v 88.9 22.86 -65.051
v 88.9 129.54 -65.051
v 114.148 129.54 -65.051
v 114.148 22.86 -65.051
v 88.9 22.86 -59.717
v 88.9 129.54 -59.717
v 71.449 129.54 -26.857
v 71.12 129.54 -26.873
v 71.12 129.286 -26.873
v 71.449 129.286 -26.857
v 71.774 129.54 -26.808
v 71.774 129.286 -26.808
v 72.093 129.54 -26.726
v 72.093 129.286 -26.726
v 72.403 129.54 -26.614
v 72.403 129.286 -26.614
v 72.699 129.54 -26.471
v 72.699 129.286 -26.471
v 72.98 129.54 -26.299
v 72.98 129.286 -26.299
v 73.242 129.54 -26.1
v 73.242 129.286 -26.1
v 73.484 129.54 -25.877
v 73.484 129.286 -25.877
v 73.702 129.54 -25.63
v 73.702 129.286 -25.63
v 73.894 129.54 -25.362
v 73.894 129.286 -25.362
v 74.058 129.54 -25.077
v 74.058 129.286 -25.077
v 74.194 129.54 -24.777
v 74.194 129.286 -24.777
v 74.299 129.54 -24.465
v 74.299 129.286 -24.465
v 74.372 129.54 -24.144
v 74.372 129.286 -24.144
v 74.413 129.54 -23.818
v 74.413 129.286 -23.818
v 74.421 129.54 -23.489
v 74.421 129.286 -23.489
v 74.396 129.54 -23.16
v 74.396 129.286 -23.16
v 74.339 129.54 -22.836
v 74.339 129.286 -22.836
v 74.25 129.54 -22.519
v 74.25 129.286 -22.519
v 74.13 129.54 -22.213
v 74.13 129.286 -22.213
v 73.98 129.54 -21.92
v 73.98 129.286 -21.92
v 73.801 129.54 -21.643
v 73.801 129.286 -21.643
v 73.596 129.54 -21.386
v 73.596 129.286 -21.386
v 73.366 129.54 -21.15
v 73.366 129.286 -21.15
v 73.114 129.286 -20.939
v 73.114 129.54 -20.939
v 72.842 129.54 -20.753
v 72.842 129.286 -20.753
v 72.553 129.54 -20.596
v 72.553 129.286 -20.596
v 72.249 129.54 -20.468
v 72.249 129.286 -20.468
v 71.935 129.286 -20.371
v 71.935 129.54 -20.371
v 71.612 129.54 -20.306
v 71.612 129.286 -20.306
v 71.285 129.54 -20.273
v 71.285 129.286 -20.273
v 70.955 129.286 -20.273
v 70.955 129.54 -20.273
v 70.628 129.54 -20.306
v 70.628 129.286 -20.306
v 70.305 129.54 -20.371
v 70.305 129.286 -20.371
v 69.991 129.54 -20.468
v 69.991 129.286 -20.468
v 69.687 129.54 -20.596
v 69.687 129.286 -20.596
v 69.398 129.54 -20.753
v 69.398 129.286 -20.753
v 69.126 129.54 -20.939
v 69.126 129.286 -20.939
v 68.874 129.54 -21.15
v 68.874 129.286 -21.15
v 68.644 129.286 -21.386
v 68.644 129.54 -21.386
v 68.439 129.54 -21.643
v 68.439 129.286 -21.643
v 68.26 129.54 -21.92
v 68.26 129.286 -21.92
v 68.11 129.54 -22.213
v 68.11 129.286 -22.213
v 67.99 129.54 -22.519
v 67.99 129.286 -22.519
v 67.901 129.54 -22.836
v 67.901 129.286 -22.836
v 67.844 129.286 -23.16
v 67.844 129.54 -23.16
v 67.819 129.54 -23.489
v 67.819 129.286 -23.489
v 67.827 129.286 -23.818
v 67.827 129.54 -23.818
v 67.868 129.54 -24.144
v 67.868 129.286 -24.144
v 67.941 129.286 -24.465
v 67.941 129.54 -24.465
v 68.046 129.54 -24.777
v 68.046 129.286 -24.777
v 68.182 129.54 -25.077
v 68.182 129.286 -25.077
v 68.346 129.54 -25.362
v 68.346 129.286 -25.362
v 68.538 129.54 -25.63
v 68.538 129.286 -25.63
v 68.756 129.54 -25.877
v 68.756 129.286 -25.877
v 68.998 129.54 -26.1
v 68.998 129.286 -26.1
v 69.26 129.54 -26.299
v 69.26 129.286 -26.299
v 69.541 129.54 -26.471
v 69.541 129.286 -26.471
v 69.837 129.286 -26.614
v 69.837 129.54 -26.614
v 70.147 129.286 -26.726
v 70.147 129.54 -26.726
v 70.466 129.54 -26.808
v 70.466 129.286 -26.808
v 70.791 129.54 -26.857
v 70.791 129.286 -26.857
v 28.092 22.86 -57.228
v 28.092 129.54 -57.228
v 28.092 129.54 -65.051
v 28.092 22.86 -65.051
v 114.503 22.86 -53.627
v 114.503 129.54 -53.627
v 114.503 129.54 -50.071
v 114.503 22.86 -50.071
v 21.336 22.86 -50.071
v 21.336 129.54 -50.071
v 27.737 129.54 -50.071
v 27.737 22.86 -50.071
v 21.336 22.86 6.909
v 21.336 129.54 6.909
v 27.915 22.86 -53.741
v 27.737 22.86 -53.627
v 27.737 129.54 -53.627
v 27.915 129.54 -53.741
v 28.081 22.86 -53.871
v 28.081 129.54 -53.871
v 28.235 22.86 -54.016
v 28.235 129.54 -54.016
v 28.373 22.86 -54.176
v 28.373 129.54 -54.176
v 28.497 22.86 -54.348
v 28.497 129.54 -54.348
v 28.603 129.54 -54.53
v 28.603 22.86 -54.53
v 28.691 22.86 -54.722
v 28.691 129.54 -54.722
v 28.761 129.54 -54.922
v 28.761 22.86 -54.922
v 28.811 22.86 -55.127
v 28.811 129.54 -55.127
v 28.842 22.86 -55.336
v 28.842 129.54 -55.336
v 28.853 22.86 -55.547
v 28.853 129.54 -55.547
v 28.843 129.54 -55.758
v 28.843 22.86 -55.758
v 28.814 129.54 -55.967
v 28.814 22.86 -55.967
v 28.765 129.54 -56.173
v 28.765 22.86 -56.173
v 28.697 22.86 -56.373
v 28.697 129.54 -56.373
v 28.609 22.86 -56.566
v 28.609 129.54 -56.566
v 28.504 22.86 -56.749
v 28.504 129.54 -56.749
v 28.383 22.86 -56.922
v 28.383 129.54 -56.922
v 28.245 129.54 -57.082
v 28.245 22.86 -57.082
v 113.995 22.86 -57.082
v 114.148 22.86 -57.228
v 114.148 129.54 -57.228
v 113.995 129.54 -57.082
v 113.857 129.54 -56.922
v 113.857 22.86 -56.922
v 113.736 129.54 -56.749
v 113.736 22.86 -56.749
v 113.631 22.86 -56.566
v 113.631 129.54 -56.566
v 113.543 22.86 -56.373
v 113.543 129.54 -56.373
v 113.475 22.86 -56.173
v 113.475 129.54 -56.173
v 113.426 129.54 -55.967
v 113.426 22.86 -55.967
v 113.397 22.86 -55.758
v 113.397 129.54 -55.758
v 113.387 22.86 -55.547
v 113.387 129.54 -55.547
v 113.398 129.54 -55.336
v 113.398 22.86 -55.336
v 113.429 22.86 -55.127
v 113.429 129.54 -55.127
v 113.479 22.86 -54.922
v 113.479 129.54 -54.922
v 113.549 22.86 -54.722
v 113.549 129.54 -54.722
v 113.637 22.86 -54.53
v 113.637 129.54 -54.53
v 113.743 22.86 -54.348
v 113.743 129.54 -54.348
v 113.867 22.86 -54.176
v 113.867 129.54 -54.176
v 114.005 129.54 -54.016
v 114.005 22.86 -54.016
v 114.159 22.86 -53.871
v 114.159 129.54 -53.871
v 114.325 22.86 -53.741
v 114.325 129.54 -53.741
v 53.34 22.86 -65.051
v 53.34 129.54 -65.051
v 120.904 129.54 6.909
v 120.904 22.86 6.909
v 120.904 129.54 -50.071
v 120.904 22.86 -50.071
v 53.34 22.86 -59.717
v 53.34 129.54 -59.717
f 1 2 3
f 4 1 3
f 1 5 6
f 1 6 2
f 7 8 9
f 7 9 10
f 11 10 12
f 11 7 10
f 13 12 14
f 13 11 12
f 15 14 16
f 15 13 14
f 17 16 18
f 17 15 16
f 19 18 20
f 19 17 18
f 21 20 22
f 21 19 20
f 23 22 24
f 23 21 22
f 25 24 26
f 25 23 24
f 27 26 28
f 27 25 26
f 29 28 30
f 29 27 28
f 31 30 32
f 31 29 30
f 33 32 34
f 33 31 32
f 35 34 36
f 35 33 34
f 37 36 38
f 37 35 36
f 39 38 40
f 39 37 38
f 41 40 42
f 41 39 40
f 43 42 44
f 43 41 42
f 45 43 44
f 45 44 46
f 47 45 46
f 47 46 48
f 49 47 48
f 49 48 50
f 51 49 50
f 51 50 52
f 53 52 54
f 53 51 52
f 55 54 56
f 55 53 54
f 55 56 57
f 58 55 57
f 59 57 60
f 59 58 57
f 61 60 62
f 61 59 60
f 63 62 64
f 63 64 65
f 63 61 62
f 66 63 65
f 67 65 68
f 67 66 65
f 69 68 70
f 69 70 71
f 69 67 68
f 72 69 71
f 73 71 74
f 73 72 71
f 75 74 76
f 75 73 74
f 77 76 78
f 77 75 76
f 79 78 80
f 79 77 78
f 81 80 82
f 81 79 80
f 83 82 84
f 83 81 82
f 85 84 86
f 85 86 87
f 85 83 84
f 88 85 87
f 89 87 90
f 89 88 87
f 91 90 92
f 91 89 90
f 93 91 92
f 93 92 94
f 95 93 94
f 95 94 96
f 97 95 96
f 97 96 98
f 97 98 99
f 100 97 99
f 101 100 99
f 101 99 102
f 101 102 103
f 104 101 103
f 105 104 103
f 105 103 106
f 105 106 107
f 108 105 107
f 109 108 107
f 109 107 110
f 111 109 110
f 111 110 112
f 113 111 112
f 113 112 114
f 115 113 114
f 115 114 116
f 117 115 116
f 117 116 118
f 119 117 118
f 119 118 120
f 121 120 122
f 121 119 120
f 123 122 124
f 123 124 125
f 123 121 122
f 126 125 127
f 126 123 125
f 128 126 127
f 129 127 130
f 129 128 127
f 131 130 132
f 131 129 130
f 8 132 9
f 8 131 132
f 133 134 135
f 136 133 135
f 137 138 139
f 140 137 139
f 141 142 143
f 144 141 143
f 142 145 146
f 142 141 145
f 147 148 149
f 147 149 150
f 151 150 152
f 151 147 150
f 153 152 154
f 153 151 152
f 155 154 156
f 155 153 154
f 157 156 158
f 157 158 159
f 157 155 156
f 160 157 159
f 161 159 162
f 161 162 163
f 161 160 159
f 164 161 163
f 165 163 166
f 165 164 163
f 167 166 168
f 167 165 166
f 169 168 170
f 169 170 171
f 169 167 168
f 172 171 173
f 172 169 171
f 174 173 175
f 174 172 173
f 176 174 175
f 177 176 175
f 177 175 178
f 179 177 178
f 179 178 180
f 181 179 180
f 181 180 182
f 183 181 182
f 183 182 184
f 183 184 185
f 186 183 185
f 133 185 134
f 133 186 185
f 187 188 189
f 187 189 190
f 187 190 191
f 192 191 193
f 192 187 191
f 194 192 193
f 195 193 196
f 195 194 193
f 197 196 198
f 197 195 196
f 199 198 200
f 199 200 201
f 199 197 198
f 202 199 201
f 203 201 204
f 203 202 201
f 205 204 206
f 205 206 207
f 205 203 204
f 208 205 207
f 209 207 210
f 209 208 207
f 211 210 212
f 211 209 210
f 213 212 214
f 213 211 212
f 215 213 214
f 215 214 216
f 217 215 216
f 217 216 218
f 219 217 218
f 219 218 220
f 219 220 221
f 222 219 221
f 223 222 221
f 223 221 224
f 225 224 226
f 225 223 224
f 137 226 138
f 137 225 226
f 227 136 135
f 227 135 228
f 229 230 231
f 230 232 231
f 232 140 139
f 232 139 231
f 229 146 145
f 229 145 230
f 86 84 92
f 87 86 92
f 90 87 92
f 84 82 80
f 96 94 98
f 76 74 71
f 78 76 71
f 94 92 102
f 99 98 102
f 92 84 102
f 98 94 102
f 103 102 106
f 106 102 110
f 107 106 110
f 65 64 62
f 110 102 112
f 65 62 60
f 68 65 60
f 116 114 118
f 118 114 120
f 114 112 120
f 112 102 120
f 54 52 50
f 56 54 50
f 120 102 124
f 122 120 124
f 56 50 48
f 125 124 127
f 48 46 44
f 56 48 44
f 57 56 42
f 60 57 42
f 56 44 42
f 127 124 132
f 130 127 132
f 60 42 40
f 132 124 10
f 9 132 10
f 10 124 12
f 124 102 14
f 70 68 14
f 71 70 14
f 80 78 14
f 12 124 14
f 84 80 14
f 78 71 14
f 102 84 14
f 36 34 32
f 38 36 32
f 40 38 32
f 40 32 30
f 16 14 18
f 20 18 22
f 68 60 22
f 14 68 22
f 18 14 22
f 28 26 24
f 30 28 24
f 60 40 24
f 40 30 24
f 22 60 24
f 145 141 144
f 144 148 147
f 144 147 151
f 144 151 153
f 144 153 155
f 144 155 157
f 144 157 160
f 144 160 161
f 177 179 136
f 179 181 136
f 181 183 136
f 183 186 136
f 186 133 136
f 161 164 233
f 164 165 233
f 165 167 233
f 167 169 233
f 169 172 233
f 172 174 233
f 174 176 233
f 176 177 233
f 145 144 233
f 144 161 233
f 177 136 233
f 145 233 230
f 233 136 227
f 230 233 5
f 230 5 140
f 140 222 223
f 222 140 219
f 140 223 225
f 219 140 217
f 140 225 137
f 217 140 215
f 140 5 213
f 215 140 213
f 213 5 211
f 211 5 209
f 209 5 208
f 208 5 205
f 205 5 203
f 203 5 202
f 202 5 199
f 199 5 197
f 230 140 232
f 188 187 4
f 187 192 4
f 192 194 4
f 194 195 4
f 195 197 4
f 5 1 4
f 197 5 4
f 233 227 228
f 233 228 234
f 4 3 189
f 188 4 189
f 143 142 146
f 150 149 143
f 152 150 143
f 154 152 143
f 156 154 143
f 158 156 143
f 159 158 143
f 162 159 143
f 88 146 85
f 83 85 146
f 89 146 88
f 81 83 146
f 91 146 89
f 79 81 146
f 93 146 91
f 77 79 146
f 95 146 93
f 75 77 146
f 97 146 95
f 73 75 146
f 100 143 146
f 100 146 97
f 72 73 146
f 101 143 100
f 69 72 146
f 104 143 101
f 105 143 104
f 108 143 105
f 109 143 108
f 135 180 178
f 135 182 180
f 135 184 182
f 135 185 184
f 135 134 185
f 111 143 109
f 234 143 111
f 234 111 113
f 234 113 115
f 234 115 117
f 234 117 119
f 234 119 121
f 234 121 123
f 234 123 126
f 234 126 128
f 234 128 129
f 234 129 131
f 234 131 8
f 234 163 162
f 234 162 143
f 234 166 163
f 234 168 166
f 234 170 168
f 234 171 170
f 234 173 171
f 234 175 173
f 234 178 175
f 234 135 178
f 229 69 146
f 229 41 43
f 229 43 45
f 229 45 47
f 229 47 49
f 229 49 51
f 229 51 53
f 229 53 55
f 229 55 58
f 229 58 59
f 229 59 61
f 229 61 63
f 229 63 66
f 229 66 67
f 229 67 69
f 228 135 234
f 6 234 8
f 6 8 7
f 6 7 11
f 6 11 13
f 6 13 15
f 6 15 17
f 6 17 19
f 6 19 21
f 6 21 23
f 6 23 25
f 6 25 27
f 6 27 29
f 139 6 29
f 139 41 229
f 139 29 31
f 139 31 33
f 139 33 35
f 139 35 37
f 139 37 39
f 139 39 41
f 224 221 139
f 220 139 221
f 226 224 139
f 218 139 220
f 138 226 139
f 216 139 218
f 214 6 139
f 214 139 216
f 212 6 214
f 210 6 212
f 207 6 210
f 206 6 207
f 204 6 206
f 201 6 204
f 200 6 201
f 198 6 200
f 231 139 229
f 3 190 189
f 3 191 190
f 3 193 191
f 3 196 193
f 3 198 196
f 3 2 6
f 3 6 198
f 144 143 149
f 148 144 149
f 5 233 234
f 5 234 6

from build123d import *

# Parameters (mm, degrees)
BOSS_EXTRUDE1_DEPTH = 152.4
SCALE1_SCALE        = 0.7
SKETCH2_W           = 99.568
SKETCH2_H           = 106.68
BOSS_EXTRUDE2_DEPTH = 17.78
SKETCH3_R           = 3.302
CUT_EXTRUDE1_DEPTH  = 0.254


with BuildPart() as part:
    # Sketch1 → Boss-Extrude1 (new body)
    with BuildSketch(Plane(origin=(0, 0, 0), x_dir=(1, 0, 0), z_dir=(0, 1, 0))):
        with BuildLine():
            Line((0, 0), (0, 56))
            Line((0, 56), (9.144, 56))
            Line((9.144, 56), (9.144, 61.08))
            ThreePointArc((9.144, 61.08), (10.722825004, 63.5214881), (9.652, 66.224613392))
            Line((9.652, 66.224613392), (9.652, 77.400613392))
            Line((9.652, 77.400613392), (45.72, 77.400613392))
            Line((45.72, 77.400613392), (45.72, 69.780613392))
            Line((45.72, 69.780613392), (96.52, 69.780613392))
            Line((96.52, 69.780613392), (96.52, 77.400613392))
            Line((96.52, 77.400613392), (132.588, 77.400613392))
            Line((132.588, 77.400613392), (132.588, 66.224613392))
            ThreePointArc((132.588, 66.224613392), (131.517174996, 63.5214881), (133.096, 61.08))
            Line((133.096, 61.08), (133.096, 56))
            Line((133.096, 56), (142.24, 56))
            Line((142.24, 56), (142.24, 0))
            Line((142.24, 0), (0, 0))
        make_face()
    extrude(amount=BOSS_EXTRUDE1_DEPTH)


with BuildPart() as part_1:
    # Scale1: scaled about (71.12, 76.2, -36.236599561)
    add(part.part.scale(SCALE1_SCALE).moved(Location((21.336, 22.86, -10.870979868))))

    # Sketch2 → Boss-Extrude2 (add)
    with BuildSketch(Plane.XY.offset(-10.870979868)):
        with Locations((71.12, 76.2)):
            Rectangle(SKETCH2_W, SKETCH2_H)
    extrude(amount=BOSS_EXTRUDE2_DEPTH)

    # Sketch3 → Cut-Extrude1 (cut)
    with BuildSketch(Plane.XZ.offset(-129.54)):
        with Locations(Location((71.12, -23.570979868, 0), (0, 0, 270))):
            Circle(SKETCH3_R)
    extrude(amount=CUT_EXTRUDE1_DEPTH, mode=Mode.SUBTRACT)


solid = part_1.part
